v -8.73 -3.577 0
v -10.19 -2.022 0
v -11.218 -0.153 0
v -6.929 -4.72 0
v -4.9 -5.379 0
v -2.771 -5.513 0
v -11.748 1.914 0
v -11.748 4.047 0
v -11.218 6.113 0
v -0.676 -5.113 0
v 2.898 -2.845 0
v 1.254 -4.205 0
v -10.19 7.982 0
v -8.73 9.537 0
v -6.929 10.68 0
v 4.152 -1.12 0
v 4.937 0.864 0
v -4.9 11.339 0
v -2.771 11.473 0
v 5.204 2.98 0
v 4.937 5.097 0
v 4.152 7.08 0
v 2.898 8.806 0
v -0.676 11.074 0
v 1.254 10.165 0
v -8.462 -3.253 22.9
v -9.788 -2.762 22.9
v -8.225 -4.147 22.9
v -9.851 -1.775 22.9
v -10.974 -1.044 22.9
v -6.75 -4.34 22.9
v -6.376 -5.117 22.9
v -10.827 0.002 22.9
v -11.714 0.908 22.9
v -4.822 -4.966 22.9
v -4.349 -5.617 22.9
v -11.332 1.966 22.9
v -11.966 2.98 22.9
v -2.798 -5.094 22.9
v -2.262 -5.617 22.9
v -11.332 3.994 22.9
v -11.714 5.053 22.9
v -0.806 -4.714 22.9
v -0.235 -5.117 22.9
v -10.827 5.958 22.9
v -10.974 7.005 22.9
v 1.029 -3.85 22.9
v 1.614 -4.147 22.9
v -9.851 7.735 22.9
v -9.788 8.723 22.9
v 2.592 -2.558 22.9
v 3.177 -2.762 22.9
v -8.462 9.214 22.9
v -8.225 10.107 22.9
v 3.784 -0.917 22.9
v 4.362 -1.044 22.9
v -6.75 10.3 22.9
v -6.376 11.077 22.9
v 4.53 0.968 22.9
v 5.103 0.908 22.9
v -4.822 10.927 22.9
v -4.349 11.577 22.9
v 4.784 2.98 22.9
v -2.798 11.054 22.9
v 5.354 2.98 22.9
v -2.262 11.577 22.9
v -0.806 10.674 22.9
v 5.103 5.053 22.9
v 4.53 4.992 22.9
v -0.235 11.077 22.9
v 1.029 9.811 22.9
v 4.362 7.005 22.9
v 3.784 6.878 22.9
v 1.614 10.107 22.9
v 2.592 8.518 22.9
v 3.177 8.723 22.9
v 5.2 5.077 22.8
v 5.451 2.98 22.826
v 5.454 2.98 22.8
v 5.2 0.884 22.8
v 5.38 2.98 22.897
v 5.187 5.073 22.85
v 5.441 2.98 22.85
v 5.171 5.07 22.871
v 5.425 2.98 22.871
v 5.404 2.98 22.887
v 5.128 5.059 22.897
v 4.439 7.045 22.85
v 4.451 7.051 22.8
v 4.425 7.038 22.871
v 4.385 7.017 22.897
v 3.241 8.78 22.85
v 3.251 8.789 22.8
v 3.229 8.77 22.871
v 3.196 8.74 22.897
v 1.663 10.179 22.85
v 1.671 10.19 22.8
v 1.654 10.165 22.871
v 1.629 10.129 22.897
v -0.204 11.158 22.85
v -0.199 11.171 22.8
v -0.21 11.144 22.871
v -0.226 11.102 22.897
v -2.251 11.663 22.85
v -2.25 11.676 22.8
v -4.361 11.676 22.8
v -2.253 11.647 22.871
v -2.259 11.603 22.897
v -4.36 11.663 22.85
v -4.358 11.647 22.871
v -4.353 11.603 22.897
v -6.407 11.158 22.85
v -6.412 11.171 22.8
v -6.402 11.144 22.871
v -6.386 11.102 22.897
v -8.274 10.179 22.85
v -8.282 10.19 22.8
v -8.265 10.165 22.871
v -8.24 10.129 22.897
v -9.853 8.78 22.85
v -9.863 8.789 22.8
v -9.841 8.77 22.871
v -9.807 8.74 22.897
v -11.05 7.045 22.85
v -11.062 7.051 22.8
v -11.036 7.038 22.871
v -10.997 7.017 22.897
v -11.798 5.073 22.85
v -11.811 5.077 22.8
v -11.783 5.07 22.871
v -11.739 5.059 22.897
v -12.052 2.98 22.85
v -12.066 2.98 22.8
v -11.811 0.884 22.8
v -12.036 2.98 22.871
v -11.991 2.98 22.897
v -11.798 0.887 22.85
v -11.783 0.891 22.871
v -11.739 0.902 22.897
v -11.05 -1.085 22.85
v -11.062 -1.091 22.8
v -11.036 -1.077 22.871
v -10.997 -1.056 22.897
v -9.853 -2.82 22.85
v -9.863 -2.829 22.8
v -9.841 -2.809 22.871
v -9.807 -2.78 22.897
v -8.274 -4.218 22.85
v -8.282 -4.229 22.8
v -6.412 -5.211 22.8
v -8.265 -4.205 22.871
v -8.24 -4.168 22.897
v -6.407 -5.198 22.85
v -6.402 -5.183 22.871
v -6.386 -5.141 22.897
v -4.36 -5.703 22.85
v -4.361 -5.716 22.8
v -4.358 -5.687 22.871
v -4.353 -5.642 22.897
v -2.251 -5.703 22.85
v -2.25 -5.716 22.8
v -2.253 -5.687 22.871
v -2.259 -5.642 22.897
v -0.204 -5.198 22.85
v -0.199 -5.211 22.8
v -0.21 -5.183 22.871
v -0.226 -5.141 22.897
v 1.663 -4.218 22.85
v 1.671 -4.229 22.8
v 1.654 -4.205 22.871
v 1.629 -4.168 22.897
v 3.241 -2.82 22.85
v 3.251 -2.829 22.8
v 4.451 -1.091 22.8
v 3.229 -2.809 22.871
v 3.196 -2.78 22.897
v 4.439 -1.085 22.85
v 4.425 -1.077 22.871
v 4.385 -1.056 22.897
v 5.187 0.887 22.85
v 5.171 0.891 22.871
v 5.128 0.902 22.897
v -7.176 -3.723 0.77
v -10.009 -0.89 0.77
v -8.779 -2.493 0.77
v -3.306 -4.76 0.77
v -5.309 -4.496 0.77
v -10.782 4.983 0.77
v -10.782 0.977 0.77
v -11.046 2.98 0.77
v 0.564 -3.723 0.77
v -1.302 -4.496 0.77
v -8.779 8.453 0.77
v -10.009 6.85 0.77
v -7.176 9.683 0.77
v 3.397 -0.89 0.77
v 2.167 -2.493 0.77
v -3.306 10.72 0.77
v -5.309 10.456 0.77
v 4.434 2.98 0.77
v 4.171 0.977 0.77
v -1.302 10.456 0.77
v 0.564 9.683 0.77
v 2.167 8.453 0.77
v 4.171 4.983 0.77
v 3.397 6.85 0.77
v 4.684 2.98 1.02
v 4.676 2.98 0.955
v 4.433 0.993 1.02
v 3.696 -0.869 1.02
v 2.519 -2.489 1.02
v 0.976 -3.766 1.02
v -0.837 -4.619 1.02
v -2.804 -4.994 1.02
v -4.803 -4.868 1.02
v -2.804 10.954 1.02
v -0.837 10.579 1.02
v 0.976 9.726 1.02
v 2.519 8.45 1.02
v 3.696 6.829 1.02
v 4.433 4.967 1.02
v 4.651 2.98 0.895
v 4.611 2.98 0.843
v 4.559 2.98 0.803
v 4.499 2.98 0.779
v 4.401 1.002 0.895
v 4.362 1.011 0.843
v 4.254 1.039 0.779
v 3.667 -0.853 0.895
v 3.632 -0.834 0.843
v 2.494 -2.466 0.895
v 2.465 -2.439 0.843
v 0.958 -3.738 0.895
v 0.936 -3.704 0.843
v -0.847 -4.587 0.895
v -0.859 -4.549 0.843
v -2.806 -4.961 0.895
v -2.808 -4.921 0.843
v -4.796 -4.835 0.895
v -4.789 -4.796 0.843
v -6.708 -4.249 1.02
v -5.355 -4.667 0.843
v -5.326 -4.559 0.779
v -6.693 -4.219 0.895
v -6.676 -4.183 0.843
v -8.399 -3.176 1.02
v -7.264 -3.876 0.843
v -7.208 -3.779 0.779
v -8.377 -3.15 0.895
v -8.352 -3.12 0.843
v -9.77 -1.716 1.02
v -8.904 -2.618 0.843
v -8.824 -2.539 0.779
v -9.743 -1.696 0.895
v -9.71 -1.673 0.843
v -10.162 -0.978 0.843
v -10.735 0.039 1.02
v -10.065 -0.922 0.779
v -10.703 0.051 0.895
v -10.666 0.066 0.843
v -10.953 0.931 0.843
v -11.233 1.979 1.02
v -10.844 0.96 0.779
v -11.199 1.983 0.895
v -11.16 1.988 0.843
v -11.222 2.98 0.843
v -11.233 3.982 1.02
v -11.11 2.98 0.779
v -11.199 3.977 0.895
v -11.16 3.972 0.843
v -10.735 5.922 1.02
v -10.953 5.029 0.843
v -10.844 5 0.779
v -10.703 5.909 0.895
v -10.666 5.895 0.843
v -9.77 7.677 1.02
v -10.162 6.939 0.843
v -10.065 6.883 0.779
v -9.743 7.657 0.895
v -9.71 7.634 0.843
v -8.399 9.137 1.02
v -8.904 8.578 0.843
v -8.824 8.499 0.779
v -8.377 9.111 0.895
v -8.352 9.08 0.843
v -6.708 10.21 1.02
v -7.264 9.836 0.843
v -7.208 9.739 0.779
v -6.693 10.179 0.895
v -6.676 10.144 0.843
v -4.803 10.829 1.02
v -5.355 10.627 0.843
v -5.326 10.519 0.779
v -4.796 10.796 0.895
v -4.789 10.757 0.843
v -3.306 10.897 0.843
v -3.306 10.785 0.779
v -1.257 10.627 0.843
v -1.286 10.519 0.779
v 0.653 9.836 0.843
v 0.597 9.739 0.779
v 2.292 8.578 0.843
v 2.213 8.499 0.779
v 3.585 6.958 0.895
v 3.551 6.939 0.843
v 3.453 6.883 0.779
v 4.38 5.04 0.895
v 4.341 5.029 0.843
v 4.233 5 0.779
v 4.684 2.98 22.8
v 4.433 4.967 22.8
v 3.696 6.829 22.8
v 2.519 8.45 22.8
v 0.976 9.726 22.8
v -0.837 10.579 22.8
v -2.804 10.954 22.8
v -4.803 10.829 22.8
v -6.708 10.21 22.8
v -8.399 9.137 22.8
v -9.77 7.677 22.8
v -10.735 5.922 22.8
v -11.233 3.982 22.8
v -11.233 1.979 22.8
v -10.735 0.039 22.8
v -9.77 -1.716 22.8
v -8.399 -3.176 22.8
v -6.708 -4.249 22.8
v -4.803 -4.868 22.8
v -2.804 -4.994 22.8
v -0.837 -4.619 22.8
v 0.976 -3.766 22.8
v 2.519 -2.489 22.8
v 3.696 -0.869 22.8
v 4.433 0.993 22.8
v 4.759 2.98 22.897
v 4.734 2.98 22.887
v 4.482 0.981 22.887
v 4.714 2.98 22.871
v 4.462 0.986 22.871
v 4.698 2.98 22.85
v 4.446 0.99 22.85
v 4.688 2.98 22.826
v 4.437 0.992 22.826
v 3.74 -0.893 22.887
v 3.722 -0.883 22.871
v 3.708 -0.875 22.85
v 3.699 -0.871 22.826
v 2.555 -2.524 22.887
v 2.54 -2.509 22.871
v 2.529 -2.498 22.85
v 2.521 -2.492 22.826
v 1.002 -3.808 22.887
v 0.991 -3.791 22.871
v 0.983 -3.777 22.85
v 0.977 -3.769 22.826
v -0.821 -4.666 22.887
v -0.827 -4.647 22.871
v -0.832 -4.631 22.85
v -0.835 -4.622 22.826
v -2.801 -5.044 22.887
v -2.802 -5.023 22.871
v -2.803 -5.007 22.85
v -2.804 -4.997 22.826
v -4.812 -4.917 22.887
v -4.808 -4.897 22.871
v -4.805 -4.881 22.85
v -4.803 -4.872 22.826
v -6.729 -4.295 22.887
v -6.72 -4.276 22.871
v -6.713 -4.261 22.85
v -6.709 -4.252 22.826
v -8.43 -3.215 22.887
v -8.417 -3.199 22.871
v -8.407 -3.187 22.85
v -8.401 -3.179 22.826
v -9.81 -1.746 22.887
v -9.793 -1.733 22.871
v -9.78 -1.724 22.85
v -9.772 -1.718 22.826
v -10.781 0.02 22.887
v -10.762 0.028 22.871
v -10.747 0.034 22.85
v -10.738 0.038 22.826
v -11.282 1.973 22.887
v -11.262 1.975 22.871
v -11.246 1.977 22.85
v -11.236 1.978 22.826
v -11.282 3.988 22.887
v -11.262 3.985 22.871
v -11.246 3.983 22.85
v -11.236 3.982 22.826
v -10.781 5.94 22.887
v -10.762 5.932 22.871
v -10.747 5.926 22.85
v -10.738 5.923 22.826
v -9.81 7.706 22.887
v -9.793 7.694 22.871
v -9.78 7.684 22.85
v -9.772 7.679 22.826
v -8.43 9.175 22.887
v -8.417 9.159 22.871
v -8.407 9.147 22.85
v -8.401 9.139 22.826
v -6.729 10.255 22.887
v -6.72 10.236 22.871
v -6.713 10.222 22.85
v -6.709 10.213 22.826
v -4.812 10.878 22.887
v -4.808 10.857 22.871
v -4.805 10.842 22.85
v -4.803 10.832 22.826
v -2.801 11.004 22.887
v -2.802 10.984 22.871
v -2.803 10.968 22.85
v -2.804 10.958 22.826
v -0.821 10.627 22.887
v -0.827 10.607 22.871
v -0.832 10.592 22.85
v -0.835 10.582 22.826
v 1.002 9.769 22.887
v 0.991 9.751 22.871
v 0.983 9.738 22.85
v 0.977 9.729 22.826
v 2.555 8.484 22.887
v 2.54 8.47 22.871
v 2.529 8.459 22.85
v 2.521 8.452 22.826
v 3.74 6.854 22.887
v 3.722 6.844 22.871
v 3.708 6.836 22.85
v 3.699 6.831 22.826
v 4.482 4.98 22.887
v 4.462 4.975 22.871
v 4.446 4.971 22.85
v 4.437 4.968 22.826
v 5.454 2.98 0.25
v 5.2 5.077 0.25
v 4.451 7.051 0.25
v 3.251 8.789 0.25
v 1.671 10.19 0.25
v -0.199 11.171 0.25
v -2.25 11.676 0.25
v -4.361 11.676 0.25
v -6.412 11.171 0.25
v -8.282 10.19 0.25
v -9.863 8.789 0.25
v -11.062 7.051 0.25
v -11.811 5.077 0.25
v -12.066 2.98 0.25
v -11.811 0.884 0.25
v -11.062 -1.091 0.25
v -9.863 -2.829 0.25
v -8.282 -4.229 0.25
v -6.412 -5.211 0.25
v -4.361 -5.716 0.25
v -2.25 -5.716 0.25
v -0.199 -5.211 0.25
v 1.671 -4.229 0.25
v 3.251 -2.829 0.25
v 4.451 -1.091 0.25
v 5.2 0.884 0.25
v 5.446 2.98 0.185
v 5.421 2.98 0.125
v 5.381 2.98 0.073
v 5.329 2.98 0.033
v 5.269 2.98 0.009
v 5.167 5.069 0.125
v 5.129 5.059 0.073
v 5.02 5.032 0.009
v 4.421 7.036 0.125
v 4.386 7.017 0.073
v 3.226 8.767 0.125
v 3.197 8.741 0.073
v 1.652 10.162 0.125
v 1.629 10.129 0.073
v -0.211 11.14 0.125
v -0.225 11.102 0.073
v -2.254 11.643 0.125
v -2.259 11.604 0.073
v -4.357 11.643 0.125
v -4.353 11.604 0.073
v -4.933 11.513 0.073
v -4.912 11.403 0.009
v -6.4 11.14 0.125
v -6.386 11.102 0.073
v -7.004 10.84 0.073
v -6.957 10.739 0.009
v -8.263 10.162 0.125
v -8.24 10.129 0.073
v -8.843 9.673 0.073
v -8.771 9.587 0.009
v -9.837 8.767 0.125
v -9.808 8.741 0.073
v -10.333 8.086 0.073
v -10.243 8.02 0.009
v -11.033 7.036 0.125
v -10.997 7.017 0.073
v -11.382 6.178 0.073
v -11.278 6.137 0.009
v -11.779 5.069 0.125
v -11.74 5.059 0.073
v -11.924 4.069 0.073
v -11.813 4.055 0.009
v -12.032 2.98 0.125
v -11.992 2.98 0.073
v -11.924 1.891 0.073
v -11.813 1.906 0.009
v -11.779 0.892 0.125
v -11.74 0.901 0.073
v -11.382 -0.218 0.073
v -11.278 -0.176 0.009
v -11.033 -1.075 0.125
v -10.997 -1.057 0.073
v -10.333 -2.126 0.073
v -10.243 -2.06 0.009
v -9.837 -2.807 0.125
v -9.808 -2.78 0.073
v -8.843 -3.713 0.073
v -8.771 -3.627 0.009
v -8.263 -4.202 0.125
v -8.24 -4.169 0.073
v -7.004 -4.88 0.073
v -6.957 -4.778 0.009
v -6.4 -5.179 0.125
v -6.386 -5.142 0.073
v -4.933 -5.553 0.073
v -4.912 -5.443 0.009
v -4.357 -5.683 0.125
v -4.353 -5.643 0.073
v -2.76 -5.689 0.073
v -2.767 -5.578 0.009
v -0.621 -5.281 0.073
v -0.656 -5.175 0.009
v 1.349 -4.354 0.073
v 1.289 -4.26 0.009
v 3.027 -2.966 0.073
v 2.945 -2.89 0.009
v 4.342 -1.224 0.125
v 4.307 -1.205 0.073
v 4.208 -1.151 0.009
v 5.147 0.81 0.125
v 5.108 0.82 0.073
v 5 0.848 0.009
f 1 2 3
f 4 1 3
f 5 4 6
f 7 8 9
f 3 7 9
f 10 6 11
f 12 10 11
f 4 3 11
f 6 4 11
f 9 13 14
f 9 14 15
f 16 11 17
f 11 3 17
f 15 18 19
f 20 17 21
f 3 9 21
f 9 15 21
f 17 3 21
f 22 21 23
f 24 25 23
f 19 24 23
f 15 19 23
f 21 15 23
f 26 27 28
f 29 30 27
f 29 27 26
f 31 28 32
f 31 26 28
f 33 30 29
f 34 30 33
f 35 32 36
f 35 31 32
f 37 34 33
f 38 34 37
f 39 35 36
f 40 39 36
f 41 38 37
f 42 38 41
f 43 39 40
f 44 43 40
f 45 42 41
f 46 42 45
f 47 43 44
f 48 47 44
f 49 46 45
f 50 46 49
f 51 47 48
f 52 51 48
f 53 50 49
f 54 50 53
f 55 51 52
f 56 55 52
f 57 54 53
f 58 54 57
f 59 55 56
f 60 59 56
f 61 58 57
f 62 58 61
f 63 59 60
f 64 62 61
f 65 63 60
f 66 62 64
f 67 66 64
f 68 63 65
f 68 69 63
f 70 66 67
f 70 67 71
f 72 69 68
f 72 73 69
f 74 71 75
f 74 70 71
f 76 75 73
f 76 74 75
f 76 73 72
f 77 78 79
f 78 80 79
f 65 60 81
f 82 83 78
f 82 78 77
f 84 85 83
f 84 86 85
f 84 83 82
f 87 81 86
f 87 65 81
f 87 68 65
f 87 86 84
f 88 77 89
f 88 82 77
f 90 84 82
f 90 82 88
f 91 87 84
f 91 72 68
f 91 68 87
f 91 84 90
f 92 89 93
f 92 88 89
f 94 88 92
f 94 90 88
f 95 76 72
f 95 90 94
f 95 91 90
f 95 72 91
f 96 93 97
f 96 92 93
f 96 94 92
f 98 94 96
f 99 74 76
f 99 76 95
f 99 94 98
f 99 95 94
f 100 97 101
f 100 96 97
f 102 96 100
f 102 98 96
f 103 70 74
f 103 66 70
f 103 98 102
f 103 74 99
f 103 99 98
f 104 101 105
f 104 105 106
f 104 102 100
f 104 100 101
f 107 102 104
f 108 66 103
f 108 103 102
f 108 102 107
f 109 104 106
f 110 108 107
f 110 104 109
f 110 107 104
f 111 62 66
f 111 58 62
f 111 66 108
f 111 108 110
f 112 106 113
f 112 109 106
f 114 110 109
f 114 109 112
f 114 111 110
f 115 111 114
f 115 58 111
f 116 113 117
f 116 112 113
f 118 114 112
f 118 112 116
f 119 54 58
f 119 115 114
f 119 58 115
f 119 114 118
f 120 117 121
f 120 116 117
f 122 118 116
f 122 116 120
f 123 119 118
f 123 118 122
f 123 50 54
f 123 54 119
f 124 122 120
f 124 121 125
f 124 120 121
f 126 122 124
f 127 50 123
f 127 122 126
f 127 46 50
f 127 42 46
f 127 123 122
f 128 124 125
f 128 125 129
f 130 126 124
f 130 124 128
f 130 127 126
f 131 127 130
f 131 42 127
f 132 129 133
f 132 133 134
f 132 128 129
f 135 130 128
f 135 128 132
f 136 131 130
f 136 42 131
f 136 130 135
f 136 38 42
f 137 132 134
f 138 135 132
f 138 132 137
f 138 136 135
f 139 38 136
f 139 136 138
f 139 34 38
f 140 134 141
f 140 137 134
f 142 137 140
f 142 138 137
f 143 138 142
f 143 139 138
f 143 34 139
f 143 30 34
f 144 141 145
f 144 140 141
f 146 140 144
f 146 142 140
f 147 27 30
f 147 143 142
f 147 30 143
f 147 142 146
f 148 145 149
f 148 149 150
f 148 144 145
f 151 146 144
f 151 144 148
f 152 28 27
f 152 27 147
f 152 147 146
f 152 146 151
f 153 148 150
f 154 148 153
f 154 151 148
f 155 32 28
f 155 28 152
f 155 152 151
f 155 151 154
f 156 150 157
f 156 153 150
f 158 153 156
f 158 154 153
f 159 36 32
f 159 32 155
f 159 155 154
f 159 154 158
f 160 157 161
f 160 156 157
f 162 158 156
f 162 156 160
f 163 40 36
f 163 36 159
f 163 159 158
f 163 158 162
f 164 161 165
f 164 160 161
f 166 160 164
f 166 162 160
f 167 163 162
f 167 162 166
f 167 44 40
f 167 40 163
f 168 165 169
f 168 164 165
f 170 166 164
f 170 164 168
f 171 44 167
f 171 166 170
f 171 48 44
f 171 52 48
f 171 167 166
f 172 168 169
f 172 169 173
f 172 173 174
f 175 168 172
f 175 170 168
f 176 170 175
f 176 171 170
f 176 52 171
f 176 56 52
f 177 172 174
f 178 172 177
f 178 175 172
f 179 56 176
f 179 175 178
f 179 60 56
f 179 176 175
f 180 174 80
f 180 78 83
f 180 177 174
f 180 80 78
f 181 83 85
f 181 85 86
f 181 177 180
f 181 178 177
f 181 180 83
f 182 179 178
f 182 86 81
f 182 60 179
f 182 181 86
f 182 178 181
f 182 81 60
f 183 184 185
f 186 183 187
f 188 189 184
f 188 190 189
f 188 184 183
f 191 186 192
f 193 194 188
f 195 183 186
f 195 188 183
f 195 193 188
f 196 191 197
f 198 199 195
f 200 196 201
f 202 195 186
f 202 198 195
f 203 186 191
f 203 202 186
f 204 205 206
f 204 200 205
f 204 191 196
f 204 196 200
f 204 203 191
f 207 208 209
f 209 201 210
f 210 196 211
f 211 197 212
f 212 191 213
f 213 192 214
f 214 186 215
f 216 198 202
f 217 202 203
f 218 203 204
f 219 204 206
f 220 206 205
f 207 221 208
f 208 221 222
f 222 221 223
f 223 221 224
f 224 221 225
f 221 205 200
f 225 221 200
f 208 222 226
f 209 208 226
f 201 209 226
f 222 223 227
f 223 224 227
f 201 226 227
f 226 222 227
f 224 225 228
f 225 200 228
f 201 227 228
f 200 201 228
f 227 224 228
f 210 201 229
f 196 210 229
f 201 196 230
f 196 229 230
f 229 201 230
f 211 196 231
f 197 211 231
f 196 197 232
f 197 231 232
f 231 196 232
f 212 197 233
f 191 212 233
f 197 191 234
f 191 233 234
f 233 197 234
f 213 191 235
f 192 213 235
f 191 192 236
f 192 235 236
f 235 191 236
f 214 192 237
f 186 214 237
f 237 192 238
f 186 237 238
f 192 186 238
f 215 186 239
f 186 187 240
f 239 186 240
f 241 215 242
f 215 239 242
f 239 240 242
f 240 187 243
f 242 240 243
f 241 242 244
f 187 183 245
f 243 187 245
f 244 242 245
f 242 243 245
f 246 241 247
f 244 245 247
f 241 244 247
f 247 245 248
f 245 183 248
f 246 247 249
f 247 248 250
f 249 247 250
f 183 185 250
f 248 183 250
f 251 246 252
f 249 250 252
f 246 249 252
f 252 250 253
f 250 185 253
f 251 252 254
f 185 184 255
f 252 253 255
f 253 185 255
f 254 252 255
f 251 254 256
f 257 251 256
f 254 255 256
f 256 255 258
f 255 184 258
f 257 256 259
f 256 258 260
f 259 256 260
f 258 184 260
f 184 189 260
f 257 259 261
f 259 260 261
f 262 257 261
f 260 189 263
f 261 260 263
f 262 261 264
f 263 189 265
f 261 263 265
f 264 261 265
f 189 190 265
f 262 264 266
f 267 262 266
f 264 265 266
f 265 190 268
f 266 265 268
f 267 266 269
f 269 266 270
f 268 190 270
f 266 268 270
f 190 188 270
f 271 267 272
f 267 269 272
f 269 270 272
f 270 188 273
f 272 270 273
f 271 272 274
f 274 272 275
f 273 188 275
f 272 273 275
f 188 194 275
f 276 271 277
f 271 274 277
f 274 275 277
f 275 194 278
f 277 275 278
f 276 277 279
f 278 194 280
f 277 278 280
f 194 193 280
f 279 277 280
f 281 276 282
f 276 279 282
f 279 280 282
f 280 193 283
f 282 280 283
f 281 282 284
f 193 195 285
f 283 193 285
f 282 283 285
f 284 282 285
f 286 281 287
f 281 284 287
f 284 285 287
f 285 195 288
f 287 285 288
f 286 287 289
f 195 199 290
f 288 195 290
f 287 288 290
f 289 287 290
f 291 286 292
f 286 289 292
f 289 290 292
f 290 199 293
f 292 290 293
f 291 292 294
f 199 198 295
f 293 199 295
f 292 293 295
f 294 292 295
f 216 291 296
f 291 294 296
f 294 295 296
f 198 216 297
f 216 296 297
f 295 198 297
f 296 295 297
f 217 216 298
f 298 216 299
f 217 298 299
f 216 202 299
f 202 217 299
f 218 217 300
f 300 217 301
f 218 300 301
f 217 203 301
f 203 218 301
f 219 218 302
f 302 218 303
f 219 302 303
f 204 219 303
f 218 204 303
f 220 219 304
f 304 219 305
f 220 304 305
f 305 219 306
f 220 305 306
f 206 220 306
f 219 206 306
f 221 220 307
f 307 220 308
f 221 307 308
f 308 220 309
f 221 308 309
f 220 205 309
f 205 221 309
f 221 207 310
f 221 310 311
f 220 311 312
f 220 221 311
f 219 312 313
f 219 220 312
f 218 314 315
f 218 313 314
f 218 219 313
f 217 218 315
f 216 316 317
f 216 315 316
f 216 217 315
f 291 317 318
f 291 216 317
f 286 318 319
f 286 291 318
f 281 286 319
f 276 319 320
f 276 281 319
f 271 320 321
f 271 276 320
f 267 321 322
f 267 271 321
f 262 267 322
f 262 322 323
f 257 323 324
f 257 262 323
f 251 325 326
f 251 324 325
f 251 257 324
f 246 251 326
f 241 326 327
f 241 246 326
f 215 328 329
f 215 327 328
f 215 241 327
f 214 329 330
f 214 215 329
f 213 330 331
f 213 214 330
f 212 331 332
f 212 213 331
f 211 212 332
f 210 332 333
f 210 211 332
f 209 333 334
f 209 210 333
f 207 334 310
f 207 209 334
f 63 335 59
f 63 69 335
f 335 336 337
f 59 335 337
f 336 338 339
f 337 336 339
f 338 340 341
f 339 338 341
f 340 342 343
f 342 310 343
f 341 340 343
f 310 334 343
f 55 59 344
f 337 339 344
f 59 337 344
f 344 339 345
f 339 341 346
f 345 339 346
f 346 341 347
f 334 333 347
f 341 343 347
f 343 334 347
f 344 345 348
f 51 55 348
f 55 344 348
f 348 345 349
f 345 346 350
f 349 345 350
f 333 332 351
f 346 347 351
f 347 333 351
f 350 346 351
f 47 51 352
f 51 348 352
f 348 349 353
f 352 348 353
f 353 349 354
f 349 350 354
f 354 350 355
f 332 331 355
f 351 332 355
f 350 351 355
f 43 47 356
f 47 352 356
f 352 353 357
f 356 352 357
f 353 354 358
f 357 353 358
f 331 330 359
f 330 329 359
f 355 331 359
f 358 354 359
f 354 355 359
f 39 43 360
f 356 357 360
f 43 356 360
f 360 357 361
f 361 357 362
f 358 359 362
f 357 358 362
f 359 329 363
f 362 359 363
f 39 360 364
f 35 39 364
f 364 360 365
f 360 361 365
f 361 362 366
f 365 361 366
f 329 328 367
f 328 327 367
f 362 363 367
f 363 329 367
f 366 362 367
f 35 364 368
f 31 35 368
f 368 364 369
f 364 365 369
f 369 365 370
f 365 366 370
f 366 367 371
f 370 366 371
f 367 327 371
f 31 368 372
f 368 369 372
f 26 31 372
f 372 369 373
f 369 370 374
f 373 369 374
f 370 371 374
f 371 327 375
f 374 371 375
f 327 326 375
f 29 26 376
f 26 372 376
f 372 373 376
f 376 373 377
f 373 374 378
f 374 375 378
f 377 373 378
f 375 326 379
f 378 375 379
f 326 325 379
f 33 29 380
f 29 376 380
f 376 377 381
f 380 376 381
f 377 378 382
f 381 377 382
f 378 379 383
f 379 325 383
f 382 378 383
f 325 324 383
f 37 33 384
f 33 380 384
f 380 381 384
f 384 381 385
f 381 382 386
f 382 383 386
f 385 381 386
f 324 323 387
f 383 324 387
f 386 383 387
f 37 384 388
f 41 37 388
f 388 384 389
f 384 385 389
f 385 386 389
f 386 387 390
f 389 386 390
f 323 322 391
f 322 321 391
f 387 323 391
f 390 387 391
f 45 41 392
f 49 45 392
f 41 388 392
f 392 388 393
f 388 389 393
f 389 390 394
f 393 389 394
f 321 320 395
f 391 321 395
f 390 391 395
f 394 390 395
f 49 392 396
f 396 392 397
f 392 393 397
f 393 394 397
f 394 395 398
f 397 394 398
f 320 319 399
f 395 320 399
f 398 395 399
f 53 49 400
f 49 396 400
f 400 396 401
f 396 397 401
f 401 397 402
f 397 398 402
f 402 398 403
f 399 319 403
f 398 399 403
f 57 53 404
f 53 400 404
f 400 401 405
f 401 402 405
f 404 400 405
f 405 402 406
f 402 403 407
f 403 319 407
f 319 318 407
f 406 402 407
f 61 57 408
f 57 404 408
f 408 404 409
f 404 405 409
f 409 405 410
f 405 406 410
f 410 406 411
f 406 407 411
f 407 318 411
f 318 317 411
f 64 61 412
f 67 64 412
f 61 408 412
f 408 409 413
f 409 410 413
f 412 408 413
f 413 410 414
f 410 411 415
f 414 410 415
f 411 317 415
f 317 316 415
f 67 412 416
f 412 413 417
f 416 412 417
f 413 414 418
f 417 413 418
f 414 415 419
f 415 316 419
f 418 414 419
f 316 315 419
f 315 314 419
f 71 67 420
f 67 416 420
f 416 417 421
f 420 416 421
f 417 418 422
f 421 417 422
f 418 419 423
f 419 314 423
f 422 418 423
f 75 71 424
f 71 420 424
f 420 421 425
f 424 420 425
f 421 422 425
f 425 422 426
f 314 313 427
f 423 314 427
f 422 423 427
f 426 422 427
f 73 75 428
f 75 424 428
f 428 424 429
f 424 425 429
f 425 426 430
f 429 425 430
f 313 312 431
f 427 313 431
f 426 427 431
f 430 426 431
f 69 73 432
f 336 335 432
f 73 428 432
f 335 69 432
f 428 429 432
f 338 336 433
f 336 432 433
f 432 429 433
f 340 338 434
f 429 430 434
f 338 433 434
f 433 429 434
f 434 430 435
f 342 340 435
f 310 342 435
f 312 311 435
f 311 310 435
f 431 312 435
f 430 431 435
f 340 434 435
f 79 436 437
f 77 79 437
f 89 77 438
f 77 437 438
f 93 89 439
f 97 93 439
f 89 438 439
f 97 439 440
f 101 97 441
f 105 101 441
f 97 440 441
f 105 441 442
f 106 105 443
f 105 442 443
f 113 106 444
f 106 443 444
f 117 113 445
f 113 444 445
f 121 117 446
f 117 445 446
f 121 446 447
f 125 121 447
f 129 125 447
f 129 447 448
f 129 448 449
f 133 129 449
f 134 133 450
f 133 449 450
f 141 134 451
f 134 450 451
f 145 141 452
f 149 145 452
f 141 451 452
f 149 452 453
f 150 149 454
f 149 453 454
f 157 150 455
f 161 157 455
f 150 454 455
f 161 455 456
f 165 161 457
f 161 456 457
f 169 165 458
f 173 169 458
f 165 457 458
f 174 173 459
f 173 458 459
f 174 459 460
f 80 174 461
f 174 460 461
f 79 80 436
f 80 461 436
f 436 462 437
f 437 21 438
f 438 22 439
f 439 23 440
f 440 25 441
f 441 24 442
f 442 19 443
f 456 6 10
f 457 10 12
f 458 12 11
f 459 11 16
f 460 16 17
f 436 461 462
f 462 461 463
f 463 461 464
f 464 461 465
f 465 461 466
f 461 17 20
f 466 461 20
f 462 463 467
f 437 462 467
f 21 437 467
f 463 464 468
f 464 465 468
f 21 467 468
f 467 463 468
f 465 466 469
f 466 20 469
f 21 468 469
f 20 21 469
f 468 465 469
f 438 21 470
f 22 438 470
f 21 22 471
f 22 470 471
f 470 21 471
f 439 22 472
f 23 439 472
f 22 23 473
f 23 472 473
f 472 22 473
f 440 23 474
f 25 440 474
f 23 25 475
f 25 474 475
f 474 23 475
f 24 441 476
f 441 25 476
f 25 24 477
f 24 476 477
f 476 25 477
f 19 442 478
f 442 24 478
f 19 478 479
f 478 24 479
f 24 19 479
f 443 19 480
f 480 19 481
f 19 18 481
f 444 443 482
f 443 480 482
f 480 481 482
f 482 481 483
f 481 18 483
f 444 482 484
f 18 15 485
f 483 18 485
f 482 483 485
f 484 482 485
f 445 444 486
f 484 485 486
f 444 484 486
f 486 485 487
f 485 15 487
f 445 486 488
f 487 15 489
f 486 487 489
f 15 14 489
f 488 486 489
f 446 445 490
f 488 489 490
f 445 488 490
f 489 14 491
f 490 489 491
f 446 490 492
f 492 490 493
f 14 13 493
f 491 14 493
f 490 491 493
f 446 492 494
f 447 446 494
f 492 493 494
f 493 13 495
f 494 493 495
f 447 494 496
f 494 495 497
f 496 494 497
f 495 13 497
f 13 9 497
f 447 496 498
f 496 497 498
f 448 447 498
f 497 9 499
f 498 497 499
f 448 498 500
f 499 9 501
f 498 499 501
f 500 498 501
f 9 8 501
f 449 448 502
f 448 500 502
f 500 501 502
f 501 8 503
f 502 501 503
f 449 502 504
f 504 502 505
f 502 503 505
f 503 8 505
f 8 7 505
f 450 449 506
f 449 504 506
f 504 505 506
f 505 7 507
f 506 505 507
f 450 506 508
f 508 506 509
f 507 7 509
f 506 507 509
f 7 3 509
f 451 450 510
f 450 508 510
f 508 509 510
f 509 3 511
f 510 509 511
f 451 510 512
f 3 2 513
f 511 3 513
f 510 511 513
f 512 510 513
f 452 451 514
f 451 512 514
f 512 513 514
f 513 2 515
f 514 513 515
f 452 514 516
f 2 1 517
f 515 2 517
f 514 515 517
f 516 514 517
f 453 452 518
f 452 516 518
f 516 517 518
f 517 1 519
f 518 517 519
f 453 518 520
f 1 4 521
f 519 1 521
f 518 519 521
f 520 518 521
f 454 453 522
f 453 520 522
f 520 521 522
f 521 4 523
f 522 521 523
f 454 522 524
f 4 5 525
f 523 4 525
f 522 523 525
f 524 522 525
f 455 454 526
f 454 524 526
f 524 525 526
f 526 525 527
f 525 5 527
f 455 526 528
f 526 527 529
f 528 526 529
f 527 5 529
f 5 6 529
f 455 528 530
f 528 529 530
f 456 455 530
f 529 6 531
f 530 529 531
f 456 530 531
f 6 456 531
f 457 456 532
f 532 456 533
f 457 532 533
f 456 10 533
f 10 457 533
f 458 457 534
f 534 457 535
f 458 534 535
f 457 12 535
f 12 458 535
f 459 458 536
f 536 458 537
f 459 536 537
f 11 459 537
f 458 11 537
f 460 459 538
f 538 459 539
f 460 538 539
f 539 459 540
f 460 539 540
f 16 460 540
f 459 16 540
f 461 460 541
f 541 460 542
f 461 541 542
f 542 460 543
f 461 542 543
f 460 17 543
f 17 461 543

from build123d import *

# Parameters (mm, degrees)
ESQUISSE1_R        = 8.76
BOSS_EXTRU_1_DEPTH = 22.9
COQUE1_T           = -0.77
CONG_1_R           = 0.25
CONG_2_R           = 0.25
CONG_3_R           = 0.1


with BuildPart() as part:
    # Esquisse1 → Boss.-Extru.1 (new body)
    with BuildSketch(Plane.XY):
        with Locations((-3.305589664, 2.980219473)):
            Circle(ESQUISSE1_R)
    extrude(amount=BOSS_EXTRU_1_DEPTH)

    # Coque1
    coque1_openings = [part.faces().sort_by_distance(p)[0] for p in [
        (-3.305589664, 2.980219473, 22.9),
    ]]
    offset(amount=COQUE1_T, openings=coque1_openings, kind=Kind.INTERSECTION)

    # Congé1
    cong_1_edges = [part.edges().sort_by_distance(p)[0] for p in [
        (-11.295589664, 2.980219473, 0.77),
    ]]
    fillet(cong_1_edges, radius=CONG_1_R)

    # Congé2
    cong_2_edges = [part.edges().sort_by_distance(p)[0] for p in [
        (-12.065589664, 2.980219473, 0),
    ]]
    fillet(cong_2_edges, radius=CONG_2_R)

    # Congé3
    cong_3_edges = [part.edges().sort_by_distance(p)[0] for p in [
        (-12.065589664, 2.980219473, 22.9),
        (-11.295589664, 2.980219473, 22.9),
    ]]
    fillet(cong_3_edges, radius=CONG_3_R)


solid = part.part
